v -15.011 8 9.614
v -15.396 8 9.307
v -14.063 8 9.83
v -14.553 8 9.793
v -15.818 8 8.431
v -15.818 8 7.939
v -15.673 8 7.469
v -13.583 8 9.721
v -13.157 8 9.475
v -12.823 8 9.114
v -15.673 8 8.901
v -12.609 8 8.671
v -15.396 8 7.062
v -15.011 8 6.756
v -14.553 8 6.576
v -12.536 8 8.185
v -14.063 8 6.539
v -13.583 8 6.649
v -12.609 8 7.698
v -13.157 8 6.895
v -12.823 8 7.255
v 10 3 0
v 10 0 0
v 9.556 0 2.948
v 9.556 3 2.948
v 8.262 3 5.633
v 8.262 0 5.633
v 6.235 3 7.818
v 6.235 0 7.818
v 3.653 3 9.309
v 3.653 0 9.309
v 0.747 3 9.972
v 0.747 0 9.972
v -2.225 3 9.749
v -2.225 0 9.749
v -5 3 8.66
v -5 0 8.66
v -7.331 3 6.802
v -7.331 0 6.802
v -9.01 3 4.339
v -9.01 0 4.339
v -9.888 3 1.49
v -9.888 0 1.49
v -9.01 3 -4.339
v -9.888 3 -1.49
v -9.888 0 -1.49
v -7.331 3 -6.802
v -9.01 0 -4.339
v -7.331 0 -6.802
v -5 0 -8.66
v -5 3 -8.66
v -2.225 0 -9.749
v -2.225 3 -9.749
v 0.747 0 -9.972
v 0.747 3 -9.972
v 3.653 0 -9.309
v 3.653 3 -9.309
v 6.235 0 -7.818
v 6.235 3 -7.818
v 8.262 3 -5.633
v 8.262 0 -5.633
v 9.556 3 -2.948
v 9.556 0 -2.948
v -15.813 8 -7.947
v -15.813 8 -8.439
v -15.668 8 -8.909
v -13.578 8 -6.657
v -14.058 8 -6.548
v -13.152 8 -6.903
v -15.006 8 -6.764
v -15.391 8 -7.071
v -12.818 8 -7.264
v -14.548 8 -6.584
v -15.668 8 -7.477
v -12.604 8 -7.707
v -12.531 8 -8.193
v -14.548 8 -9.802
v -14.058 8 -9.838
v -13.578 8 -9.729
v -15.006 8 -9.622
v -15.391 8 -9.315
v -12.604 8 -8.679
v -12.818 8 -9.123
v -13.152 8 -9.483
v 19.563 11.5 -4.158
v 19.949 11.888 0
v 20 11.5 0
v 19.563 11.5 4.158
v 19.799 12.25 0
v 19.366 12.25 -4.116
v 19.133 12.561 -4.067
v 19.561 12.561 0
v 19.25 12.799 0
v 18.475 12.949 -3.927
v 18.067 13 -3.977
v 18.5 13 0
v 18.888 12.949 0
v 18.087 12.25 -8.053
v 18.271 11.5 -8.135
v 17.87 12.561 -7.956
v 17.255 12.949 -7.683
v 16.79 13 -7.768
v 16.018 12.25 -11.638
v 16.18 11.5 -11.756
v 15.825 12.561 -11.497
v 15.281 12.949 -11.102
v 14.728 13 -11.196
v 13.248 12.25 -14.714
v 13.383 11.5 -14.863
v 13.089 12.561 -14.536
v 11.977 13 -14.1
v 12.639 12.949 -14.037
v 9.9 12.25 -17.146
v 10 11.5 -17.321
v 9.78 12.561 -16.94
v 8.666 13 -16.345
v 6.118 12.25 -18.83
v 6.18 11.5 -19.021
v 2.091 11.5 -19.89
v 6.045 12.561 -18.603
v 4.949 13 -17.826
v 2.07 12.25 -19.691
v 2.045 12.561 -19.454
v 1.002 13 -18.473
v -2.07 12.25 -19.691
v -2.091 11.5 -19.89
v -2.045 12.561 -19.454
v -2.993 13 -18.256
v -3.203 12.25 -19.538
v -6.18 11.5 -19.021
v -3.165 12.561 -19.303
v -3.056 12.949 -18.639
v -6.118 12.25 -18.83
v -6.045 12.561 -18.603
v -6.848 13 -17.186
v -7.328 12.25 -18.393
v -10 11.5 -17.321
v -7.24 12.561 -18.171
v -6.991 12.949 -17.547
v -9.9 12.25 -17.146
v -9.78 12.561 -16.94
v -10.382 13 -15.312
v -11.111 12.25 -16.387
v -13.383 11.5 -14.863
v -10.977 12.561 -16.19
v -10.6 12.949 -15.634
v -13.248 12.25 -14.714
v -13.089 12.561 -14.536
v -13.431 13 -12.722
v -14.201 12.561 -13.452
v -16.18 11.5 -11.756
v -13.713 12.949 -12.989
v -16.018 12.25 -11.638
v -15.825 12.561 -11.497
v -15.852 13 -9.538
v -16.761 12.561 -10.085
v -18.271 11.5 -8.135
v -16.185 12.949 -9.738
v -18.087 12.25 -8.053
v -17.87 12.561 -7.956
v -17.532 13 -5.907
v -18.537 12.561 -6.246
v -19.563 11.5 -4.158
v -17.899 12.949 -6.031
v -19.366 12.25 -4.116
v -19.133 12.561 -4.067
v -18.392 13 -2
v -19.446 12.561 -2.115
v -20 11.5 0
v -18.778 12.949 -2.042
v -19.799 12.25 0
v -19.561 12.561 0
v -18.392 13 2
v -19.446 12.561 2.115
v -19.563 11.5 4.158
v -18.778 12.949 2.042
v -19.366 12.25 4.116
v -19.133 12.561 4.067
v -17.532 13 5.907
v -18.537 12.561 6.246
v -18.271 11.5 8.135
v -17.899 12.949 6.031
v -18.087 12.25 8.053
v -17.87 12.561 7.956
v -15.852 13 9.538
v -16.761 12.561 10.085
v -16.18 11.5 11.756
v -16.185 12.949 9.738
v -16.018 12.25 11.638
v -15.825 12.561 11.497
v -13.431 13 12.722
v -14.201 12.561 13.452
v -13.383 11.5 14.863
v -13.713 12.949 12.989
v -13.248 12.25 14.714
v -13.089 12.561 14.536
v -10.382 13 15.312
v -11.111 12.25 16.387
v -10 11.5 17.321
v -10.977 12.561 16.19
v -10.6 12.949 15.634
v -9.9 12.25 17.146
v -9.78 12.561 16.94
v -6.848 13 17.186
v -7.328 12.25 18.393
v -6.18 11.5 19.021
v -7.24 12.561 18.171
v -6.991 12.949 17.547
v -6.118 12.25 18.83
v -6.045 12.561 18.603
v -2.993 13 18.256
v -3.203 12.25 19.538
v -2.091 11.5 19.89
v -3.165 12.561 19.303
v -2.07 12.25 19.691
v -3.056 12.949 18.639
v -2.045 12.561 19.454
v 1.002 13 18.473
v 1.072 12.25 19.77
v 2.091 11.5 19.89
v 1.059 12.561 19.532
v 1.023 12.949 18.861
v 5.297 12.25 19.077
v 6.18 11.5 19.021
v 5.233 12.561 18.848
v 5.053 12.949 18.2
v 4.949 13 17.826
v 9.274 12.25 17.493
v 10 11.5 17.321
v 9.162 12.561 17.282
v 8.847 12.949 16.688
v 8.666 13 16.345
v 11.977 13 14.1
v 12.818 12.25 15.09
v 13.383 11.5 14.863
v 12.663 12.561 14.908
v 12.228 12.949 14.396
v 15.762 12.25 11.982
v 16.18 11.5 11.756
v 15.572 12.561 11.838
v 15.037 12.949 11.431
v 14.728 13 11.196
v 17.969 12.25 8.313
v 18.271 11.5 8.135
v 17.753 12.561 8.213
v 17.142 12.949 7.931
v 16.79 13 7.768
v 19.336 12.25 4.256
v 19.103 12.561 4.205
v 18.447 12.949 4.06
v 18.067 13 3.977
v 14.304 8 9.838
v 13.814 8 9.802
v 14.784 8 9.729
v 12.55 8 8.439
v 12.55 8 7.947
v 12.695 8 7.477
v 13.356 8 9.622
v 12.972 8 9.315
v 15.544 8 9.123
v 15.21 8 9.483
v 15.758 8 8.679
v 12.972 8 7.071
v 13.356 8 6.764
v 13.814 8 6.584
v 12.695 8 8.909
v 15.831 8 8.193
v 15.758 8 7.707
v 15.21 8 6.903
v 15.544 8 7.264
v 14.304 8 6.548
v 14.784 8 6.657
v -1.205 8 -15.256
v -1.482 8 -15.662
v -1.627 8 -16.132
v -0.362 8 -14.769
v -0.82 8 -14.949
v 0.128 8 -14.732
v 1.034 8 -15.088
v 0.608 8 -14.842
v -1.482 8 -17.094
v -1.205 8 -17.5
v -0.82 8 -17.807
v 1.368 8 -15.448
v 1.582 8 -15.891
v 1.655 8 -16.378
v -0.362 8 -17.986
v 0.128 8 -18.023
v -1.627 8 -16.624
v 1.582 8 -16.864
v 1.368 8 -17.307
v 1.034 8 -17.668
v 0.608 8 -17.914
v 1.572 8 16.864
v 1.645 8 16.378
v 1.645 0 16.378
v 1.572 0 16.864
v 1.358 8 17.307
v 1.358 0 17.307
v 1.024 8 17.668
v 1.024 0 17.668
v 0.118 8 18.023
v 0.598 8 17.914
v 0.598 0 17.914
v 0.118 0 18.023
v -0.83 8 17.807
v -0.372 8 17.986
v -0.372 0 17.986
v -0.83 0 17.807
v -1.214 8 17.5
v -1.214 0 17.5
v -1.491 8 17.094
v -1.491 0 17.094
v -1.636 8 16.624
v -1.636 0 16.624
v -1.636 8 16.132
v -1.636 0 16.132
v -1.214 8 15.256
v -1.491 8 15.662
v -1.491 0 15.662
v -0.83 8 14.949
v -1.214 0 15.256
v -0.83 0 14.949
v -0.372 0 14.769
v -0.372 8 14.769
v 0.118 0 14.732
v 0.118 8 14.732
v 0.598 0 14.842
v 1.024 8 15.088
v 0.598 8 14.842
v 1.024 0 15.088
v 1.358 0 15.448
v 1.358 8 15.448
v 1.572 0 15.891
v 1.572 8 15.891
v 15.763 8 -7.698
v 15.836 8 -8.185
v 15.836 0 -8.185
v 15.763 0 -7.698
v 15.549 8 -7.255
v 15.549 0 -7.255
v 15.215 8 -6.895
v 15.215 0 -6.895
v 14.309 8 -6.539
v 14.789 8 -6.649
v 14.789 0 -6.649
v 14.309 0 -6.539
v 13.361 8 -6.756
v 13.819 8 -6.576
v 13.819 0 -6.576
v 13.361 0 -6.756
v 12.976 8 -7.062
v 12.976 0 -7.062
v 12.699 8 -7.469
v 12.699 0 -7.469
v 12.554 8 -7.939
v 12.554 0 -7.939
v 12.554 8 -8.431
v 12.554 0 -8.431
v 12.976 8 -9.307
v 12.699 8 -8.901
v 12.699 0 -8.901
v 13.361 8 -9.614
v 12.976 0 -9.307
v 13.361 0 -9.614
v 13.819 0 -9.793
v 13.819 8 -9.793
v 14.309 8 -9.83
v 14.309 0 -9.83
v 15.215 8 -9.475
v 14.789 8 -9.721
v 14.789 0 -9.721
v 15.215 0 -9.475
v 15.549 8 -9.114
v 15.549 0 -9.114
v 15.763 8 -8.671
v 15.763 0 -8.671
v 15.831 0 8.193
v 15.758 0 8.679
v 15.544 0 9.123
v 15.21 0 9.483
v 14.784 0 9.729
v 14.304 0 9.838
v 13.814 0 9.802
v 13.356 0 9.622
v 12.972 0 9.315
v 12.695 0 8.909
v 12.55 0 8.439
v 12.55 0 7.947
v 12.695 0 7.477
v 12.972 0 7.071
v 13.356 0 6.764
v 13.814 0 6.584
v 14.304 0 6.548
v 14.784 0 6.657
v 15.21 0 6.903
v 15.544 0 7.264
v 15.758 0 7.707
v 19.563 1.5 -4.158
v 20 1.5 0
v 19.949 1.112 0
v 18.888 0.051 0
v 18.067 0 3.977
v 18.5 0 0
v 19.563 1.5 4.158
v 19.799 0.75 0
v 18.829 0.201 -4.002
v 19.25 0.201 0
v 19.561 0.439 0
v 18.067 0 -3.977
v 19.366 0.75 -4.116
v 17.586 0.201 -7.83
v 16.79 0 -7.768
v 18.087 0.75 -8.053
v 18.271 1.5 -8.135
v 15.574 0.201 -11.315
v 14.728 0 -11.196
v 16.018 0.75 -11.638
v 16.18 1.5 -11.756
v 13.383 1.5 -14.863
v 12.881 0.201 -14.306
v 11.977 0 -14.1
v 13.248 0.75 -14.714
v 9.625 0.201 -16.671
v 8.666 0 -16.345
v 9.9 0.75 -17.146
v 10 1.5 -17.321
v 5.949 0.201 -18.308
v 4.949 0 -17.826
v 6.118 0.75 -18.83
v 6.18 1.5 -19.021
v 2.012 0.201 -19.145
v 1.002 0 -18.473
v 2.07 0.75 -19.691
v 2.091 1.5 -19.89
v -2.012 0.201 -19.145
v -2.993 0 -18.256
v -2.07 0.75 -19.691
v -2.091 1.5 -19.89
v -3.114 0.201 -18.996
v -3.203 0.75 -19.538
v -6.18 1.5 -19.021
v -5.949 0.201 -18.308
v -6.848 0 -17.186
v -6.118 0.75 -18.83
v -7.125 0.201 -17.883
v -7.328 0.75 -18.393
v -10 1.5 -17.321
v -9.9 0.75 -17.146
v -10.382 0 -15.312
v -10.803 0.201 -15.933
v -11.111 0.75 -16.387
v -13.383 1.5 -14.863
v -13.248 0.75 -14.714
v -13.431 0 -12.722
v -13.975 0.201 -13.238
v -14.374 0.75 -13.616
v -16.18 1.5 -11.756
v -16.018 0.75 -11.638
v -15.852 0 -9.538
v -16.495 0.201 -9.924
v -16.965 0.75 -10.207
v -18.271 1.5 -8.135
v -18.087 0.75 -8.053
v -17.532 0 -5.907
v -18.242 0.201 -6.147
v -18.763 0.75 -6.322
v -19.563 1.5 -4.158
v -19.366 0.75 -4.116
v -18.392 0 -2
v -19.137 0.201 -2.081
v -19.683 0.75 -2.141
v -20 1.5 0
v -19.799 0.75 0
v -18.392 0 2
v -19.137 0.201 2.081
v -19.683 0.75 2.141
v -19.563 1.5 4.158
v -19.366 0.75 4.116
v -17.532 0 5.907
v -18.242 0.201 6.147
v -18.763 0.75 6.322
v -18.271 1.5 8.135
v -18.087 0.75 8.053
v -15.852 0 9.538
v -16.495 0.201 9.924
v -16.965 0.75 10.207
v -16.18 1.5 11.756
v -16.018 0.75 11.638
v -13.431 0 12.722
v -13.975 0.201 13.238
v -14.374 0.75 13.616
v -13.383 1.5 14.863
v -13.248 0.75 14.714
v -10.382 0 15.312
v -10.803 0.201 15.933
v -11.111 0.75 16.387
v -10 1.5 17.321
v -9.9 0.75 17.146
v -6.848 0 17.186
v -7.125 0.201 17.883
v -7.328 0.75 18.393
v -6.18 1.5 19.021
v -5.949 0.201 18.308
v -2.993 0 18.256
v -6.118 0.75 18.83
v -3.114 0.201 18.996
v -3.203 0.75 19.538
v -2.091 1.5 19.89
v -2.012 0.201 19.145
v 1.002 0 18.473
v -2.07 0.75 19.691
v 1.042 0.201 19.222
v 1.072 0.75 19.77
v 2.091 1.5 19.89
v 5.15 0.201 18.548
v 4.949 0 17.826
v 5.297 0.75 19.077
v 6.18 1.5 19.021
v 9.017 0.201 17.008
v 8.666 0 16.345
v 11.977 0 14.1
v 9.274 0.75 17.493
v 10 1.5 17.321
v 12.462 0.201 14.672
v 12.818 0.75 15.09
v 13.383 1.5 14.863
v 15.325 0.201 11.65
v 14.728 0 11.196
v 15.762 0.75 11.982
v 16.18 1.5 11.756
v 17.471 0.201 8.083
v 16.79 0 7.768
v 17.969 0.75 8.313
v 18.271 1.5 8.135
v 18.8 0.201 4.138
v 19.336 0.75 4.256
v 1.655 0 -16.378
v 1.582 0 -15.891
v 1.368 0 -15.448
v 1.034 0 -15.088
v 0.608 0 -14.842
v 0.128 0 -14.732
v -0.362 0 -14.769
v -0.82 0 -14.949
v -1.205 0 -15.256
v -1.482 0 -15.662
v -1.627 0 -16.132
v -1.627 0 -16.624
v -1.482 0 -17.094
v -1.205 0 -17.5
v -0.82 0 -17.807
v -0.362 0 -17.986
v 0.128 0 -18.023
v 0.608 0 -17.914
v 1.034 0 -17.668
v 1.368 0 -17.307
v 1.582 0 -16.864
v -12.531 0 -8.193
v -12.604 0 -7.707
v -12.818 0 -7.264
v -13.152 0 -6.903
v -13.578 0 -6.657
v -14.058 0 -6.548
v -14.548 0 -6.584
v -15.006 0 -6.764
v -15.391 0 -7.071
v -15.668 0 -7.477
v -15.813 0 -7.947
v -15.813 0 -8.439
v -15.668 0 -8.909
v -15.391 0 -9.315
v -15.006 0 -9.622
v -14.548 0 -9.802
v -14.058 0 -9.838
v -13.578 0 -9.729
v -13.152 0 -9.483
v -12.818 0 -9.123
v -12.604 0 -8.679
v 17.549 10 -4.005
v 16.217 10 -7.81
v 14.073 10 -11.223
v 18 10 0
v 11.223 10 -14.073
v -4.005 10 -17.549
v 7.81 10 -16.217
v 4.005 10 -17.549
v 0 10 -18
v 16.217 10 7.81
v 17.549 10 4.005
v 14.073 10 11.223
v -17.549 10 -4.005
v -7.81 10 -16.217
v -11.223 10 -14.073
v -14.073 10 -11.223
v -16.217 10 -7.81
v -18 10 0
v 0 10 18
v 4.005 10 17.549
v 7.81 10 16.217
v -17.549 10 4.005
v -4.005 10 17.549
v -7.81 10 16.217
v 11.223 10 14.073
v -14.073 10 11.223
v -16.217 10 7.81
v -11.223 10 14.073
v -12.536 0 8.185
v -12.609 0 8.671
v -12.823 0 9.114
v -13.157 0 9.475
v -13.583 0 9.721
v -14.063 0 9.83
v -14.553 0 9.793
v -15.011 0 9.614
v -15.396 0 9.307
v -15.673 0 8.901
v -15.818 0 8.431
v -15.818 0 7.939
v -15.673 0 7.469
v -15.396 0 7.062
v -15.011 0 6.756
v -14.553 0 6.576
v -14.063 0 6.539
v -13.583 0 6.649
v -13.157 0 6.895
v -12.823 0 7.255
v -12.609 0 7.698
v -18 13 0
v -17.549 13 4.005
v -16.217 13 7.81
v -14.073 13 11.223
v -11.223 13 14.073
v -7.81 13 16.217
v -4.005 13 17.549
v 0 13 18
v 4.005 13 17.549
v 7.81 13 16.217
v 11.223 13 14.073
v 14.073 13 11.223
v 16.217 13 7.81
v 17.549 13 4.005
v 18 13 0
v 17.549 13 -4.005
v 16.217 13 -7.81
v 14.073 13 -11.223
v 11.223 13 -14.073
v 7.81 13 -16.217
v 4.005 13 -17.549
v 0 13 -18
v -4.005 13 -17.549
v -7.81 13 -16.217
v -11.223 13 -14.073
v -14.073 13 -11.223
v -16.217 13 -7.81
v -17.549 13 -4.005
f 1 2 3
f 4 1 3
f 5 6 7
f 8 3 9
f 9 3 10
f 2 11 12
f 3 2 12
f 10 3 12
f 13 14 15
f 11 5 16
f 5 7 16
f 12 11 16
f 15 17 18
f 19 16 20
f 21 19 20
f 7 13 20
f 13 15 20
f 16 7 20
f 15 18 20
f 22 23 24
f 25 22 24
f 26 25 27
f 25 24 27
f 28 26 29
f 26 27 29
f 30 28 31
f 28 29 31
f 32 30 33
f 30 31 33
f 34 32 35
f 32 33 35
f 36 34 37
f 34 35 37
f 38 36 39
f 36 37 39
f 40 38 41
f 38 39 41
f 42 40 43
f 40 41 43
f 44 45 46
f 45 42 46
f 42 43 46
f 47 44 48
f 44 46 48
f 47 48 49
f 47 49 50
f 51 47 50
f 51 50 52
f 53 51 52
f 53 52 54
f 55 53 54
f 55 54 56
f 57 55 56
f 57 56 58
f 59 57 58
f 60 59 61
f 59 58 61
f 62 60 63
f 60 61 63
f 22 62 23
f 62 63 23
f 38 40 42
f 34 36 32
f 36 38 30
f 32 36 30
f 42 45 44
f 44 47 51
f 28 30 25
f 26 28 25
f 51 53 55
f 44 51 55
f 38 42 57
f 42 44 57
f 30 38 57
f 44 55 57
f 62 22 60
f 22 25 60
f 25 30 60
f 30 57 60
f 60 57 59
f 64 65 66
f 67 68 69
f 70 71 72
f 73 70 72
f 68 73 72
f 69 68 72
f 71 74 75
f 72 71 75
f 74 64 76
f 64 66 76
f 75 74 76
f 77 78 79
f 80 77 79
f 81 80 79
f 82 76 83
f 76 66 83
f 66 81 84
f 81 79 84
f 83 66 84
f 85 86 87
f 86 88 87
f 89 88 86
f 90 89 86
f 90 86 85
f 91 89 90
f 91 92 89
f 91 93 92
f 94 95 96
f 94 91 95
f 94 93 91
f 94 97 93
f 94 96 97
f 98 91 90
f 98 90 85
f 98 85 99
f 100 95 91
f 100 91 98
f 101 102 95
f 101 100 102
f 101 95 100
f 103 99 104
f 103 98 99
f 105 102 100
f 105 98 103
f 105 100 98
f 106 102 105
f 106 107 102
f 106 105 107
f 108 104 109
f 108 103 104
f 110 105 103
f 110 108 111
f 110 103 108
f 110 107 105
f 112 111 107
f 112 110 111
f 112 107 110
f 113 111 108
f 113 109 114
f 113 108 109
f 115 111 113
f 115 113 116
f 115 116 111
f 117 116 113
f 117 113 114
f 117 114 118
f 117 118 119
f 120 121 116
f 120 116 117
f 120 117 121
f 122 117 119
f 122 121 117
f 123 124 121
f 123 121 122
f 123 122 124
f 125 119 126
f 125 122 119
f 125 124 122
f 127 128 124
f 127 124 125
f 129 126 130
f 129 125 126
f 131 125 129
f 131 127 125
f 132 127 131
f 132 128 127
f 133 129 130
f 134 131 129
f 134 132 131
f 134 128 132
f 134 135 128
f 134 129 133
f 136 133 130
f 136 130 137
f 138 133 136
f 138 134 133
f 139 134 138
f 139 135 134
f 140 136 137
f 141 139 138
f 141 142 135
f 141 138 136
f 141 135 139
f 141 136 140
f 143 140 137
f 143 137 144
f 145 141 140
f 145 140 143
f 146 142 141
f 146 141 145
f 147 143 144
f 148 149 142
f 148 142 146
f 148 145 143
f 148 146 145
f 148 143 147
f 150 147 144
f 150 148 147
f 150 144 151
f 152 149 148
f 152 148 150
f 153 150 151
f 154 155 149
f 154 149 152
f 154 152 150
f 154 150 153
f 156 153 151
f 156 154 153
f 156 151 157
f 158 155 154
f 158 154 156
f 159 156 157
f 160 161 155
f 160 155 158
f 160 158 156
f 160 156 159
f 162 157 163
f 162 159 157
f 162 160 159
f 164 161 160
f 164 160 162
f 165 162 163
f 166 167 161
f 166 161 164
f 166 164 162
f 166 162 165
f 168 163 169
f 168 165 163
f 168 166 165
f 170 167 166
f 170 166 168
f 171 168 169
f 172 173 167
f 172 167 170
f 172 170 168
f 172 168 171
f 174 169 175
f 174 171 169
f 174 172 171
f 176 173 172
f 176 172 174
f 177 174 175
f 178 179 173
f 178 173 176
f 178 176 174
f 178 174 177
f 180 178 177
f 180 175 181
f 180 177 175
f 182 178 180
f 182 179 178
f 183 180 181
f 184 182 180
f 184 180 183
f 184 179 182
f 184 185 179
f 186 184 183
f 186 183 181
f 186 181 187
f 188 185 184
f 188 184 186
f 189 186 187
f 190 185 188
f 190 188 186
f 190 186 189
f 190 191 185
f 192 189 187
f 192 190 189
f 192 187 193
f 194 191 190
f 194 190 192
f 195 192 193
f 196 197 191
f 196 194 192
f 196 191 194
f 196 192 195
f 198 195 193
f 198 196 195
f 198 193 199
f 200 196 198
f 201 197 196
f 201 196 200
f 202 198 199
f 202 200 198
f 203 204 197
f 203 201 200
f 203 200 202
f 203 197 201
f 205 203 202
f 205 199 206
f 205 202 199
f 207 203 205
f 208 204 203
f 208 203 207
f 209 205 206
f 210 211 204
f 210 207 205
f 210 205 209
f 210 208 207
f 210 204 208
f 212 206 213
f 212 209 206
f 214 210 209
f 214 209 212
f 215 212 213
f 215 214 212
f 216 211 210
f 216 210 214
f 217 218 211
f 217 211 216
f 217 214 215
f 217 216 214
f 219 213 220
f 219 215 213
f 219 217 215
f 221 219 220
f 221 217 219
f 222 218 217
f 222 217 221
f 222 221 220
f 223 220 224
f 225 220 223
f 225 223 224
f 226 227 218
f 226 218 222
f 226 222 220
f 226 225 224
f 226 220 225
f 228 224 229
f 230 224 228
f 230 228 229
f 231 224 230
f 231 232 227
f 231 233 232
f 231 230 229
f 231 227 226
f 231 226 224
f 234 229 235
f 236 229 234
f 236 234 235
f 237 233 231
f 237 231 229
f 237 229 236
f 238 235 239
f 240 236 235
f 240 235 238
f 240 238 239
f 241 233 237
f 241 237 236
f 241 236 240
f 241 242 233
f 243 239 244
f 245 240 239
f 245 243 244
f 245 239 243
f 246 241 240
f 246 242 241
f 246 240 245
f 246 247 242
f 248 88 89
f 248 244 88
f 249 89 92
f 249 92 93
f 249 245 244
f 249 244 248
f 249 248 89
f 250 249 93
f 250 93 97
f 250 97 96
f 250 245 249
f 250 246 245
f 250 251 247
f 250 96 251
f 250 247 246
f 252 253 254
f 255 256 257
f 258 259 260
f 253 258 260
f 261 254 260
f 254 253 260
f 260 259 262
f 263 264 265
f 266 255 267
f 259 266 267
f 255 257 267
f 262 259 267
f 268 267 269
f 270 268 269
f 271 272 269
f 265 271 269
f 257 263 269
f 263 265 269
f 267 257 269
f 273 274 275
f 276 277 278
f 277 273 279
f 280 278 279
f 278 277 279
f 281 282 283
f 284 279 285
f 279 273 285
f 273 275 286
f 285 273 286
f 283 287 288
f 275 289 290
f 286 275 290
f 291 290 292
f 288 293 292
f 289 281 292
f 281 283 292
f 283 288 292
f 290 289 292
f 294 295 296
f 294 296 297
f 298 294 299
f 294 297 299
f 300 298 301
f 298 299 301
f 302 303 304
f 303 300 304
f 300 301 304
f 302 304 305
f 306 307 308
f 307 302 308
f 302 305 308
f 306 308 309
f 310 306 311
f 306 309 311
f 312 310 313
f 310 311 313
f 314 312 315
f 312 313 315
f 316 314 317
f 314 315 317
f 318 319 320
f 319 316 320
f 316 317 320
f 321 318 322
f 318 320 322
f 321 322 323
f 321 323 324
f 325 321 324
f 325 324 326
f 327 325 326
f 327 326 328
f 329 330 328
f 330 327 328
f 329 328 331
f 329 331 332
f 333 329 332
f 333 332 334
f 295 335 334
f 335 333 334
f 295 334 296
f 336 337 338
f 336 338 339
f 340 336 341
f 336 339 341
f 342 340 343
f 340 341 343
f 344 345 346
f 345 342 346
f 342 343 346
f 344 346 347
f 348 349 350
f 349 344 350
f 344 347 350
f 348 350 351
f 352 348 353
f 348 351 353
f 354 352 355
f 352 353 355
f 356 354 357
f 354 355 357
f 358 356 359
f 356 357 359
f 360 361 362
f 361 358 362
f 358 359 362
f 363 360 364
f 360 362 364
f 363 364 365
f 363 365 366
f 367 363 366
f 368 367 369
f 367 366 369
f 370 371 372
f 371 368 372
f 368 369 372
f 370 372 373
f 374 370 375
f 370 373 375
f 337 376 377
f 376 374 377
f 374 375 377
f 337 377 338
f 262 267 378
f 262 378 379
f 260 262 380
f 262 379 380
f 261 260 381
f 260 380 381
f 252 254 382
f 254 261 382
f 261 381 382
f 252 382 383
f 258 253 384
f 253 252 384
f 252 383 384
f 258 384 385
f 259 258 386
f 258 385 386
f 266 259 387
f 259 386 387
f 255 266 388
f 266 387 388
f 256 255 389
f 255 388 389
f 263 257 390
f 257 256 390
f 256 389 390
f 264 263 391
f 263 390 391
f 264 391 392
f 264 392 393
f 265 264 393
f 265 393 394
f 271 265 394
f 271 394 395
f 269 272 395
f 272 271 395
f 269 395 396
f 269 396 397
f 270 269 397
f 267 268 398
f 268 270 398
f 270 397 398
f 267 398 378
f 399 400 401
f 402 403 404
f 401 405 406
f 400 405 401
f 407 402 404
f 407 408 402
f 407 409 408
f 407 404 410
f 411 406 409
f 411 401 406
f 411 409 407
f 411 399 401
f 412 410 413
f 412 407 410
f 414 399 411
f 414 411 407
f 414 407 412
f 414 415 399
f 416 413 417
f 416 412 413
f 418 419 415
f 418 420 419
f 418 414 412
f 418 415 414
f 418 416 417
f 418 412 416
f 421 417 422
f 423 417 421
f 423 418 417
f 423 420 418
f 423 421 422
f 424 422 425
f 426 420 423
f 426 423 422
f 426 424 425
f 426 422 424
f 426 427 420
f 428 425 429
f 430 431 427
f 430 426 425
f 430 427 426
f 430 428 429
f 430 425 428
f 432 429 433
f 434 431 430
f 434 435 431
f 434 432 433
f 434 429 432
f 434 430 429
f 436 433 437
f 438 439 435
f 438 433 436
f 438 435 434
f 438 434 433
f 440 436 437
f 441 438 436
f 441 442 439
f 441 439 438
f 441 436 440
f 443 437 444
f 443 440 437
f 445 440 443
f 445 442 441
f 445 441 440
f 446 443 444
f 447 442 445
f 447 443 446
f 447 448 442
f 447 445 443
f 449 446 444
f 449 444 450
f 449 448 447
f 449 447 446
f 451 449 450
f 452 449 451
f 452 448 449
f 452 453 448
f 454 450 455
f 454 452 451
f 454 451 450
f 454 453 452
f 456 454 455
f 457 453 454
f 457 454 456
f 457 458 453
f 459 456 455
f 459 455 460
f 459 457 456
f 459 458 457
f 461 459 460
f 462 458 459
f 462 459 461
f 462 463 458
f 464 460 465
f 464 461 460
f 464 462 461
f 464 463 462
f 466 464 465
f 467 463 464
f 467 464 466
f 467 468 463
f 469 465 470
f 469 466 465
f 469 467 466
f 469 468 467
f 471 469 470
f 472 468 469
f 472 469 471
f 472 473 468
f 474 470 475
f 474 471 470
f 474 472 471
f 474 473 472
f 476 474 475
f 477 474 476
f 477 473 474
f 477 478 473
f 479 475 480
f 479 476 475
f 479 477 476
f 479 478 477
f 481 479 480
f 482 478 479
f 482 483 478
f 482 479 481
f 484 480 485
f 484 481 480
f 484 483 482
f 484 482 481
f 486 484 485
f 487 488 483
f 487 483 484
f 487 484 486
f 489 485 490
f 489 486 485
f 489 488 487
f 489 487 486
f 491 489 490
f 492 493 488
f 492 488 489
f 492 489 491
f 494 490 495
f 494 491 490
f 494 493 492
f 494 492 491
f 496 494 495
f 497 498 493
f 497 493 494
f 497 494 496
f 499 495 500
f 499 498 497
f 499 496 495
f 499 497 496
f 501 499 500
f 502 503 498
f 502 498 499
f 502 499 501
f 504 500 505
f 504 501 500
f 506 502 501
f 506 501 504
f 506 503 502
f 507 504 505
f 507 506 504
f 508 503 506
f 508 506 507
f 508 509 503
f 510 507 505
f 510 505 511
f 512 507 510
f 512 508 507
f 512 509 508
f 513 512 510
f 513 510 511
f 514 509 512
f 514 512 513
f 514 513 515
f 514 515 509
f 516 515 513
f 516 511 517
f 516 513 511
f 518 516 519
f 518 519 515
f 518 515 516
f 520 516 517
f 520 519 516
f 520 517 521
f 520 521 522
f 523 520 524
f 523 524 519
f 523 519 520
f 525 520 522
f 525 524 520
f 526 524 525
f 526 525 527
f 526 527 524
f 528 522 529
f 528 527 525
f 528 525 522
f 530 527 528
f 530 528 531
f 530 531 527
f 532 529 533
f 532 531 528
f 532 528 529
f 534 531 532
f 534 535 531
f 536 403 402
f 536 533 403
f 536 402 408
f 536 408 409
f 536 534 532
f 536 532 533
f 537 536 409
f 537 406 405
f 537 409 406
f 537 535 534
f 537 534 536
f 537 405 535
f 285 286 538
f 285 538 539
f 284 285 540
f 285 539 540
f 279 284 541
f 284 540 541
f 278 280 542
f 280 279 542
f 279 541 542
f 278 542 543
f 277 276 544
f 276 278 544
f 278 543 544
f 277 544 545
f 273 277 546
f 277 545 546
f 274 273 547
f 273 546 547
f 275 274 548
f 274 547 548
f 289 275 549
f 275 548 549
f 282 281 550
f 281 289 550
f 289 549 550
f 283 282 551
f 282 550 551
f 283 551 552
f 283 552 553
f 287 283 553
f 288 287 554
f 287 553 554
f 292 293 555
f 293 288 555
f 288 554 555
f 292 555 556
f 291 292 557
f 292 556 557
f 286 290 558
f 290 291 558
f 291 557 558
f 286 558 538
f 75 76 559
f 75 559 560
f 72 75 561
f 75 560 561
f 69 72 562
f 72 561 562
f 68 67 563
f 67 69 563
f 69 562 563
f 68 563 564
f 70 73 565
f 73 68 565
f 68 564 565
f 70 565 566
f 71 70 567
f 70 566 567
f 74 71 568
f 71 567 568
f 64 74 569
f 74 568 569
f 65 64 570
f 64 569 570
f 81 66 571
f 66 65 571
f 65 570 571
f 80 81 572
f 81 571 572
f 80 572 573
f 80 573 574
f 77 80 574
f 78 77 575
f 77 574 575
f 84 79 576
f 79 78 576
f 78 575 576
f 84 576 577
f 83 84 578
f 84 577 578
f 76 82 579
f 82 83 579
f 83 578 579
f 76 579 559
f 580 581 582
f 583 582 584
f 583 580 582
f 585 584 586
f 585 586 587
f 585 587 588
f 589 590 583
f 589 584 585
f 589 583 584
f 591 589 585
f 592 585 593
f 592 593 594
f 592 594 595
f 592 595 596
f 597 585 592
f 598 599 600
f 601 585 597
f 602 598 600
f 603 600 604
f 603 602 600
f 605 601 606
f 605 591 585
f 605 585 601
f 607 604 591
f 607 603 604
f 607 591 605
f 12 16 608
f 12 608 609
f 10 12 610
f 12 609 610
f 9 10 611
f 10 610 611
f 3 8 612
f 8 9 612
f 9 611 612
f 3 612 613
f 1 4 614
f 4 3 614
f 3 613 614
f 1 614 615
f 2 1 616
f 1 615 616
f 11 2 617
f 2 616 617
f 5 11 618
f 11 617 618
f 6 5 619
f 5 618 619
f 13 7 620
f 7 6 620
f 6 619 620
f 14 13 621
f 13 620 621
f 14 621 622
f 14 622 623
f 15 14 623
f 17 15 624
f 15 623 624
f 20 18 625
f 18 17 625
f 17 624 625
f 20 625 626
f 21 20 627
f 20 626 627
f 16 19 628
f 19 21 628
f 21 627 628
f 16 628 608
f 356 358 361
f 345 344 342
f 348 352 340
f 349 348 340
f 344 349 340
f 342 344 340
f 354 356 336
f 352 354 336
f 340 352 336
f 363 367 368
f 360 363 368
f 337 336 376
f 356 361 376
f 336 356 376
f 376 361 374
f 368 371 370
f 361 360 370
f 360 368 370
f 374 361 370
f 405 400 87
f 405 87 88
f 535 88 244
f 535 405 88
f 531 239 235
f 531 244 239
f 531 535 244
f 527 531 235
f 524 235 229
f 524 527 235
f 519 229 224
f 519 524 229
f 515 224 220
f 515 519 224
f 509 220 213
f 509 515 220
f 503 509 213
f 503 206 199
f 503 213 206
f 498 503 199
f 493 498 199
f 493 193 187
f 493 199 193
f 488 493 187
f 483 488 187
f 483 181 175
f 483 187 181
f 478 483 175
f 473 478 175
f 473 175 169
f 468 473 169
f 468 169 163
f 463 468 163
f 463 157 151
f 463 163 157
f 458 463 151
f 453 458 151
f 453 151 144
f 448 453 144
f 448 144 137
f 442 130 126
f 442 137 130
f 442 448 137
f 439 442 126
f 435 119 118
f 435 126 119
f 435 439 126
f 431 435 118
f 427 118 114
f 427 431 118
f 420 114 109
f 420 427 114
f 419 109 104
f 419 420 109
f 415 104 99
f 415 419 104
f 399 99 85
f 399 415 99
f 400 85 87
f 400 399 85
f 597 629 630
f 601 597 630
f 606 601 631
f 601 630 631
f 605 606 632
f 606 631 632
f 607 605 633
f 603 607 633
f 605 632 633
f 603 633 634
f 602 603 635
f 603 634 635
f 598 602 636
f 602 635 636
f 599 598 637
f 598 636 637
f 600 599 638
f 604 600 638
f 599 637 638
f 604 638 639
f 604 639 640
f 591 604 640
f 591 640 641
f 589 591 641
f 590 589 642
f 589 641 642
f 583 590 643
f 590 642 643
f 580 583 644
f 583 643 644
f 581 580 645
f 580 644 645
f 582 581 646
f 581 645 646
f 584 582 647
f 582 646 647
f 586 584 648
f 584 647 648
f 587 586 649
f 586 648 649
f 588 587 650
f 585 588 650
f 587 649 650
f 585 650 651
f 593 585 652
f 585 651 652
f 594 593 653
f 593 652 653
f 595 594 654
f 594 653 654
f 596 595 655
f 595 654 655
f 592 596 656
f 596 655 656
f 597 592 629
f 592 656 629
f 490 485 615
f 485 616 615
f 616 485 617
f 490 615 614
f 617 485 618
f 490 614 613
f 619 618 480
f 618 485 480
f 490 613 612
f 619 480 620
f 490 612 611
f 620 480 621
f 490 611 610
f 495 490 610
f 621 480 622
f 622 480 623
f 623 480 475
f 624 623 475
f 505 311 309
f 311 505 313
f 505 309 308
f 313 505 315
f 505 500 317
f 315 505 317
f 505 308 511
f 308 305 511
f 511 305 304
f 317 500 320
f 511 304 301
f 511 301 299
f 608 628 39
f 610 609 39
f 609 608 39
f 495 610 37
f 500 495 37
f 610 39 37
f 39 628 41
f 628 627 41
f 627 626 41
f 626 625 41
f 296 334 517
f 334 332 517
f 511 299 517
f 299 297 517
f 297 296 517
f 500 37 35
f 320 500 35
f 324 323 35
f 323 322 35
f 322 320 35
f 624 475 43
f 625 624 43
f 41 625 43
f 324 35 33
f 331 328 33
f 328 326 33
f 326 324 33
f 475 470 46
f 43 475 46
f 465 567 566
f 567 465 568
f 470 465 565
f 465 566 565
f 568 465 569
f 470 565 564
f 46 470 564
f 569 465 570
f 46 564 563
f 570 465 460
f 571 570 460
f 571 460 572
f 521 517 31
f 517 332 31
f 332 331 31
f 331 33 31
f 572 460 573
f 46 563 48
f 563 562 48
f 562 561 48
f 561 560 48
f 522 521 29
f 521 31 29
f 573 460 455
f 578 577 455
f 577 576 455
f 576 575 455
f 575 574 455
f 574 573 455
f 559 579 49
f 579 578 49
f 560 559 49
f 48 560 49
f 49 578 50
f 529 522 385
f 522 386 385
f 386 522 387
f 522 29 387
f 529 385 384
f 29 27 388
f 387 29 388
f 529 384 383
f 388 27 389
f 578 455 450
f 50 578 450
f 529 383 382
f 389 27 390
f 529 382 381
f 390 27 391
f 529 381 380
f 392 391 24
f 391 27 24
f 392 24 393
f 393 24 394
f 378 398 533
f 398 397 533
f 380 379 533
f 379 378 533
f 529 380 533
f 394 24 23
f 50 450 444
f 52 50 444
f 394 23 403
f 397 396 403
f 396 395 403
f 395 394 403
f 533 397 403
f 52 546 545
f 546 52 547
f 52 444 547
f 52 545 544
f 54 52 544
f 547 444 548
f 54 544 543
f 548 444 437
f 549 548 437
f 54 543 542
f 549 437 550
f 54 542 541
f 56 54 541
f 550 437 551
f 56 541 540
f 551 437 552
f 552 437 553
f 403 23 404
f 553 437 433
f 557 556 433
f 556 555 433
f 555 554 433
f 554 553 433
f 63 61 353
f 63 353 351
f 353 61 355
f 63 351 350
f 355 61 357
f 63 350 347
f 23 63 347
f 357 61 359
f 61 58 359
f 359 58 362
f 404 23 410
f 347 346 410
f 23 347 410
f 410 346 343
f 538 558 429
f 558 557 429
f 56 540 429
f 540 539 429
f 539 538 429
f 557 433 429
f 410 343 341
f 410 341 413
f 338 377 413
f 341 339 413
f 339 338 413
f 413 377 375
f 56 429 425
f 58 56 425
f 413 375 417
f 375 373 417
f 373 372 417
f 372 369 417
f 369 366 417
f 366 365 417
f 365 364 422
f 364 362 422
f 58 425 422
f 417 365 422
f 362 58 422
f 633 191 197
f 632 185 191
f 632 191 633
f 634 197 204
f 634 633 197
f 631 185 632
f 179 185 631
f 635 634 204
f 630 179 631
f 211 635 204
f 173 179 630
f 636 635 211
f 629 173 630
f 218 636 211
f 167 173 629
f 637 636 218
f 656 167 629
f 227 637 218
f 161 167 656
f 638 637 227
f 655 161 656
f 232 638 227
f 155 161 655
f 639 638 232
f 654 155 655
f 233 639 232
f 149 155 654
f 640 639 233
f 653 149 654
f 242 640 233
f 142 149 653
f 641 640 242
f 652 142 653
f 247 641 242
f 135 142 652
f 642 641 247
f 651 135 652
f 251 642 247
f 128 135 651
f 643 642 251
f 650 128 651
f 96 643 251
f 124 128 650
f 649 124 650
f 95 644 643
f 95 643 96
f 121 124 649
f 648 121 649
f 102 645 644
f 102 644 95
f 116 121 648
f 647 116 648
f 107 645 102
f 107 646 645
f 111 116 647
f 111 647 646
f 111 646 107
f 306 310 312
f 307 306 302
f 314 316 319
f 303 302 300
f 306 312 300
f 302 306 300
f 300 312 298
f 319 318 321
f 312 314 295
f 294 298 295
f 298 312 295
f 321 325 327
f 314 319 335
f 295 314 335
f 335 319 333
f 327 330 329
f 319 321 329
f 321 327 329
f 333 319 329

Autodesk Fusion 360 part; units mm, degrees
sketch "Sketch1" plane through (0, 0, 0) normal (0, 1, 0) x (1, 0, 0)
  circle A0 centre (0, 0) radius 10
  circle A1 centre (0, 0) radius 20
  circle A2 centre (0, 0) radius 18.0278 construction
  circle A3 centre (-0.0049, -16.3778) radius 1.65
  line L0 (0, -22) -> (0, 22) construction
  line L1 (-25, 0) -> (28, 0) construction
  circle A4 centre (0, 0) radius 10
  circle A5 centre (0, 0) radius 10
  circle A6 centre (14.1811, -8.1931) radius 1.65
  circle A7 centre (14.186, 8.1846) radius 1.65
  circle A8 centre (0.0049, 16.3778) radius 1.65
  circle A9 centre (-14.1811, 8.1931) radius 1.65
  circle A10 centre (-14.186, -8.1846) radius 1.65
  point P0 (-0.0049, -16.3778)
  point P1 (-0.0049, 16.3778)
  dimension "d1" = 20
  dimension "d2" = 40
  dimension "d3" = 3.3
  dimension "d16" = 360
extrude "Extrude1" add sketch "Sketch1" along normal blind 13 contours A0 A4 A5 | A1 | A3 | A6 | A7 | A8 | A9 | A10
extrude "Extrude3" cut sketch "Sketch1" along normal blind 3 contours A0 A4 A5
fillet "Fillet1" radius 1.5 2 edges at (-18.6465, 0, 7.2323) (-18.6465, 13, 7.2323)
extrude "Extrude4" cut sketch "Sketch1" along normal blind 8 contours A3 | A6 | A7 | A8 | A9 | A10
sketch "Sketch2" plane through (0, 13, 0) normal (0, 1, 0) x (-1, 0, 0)
  circle A0 centre (0, 0) radius 18.5
  circle A1 centre (0, 0) radius 18
  dimension "d17" = 36
extrude "Extrude5" cut sketch "Sketch2" against normal blind 3 contours A1
